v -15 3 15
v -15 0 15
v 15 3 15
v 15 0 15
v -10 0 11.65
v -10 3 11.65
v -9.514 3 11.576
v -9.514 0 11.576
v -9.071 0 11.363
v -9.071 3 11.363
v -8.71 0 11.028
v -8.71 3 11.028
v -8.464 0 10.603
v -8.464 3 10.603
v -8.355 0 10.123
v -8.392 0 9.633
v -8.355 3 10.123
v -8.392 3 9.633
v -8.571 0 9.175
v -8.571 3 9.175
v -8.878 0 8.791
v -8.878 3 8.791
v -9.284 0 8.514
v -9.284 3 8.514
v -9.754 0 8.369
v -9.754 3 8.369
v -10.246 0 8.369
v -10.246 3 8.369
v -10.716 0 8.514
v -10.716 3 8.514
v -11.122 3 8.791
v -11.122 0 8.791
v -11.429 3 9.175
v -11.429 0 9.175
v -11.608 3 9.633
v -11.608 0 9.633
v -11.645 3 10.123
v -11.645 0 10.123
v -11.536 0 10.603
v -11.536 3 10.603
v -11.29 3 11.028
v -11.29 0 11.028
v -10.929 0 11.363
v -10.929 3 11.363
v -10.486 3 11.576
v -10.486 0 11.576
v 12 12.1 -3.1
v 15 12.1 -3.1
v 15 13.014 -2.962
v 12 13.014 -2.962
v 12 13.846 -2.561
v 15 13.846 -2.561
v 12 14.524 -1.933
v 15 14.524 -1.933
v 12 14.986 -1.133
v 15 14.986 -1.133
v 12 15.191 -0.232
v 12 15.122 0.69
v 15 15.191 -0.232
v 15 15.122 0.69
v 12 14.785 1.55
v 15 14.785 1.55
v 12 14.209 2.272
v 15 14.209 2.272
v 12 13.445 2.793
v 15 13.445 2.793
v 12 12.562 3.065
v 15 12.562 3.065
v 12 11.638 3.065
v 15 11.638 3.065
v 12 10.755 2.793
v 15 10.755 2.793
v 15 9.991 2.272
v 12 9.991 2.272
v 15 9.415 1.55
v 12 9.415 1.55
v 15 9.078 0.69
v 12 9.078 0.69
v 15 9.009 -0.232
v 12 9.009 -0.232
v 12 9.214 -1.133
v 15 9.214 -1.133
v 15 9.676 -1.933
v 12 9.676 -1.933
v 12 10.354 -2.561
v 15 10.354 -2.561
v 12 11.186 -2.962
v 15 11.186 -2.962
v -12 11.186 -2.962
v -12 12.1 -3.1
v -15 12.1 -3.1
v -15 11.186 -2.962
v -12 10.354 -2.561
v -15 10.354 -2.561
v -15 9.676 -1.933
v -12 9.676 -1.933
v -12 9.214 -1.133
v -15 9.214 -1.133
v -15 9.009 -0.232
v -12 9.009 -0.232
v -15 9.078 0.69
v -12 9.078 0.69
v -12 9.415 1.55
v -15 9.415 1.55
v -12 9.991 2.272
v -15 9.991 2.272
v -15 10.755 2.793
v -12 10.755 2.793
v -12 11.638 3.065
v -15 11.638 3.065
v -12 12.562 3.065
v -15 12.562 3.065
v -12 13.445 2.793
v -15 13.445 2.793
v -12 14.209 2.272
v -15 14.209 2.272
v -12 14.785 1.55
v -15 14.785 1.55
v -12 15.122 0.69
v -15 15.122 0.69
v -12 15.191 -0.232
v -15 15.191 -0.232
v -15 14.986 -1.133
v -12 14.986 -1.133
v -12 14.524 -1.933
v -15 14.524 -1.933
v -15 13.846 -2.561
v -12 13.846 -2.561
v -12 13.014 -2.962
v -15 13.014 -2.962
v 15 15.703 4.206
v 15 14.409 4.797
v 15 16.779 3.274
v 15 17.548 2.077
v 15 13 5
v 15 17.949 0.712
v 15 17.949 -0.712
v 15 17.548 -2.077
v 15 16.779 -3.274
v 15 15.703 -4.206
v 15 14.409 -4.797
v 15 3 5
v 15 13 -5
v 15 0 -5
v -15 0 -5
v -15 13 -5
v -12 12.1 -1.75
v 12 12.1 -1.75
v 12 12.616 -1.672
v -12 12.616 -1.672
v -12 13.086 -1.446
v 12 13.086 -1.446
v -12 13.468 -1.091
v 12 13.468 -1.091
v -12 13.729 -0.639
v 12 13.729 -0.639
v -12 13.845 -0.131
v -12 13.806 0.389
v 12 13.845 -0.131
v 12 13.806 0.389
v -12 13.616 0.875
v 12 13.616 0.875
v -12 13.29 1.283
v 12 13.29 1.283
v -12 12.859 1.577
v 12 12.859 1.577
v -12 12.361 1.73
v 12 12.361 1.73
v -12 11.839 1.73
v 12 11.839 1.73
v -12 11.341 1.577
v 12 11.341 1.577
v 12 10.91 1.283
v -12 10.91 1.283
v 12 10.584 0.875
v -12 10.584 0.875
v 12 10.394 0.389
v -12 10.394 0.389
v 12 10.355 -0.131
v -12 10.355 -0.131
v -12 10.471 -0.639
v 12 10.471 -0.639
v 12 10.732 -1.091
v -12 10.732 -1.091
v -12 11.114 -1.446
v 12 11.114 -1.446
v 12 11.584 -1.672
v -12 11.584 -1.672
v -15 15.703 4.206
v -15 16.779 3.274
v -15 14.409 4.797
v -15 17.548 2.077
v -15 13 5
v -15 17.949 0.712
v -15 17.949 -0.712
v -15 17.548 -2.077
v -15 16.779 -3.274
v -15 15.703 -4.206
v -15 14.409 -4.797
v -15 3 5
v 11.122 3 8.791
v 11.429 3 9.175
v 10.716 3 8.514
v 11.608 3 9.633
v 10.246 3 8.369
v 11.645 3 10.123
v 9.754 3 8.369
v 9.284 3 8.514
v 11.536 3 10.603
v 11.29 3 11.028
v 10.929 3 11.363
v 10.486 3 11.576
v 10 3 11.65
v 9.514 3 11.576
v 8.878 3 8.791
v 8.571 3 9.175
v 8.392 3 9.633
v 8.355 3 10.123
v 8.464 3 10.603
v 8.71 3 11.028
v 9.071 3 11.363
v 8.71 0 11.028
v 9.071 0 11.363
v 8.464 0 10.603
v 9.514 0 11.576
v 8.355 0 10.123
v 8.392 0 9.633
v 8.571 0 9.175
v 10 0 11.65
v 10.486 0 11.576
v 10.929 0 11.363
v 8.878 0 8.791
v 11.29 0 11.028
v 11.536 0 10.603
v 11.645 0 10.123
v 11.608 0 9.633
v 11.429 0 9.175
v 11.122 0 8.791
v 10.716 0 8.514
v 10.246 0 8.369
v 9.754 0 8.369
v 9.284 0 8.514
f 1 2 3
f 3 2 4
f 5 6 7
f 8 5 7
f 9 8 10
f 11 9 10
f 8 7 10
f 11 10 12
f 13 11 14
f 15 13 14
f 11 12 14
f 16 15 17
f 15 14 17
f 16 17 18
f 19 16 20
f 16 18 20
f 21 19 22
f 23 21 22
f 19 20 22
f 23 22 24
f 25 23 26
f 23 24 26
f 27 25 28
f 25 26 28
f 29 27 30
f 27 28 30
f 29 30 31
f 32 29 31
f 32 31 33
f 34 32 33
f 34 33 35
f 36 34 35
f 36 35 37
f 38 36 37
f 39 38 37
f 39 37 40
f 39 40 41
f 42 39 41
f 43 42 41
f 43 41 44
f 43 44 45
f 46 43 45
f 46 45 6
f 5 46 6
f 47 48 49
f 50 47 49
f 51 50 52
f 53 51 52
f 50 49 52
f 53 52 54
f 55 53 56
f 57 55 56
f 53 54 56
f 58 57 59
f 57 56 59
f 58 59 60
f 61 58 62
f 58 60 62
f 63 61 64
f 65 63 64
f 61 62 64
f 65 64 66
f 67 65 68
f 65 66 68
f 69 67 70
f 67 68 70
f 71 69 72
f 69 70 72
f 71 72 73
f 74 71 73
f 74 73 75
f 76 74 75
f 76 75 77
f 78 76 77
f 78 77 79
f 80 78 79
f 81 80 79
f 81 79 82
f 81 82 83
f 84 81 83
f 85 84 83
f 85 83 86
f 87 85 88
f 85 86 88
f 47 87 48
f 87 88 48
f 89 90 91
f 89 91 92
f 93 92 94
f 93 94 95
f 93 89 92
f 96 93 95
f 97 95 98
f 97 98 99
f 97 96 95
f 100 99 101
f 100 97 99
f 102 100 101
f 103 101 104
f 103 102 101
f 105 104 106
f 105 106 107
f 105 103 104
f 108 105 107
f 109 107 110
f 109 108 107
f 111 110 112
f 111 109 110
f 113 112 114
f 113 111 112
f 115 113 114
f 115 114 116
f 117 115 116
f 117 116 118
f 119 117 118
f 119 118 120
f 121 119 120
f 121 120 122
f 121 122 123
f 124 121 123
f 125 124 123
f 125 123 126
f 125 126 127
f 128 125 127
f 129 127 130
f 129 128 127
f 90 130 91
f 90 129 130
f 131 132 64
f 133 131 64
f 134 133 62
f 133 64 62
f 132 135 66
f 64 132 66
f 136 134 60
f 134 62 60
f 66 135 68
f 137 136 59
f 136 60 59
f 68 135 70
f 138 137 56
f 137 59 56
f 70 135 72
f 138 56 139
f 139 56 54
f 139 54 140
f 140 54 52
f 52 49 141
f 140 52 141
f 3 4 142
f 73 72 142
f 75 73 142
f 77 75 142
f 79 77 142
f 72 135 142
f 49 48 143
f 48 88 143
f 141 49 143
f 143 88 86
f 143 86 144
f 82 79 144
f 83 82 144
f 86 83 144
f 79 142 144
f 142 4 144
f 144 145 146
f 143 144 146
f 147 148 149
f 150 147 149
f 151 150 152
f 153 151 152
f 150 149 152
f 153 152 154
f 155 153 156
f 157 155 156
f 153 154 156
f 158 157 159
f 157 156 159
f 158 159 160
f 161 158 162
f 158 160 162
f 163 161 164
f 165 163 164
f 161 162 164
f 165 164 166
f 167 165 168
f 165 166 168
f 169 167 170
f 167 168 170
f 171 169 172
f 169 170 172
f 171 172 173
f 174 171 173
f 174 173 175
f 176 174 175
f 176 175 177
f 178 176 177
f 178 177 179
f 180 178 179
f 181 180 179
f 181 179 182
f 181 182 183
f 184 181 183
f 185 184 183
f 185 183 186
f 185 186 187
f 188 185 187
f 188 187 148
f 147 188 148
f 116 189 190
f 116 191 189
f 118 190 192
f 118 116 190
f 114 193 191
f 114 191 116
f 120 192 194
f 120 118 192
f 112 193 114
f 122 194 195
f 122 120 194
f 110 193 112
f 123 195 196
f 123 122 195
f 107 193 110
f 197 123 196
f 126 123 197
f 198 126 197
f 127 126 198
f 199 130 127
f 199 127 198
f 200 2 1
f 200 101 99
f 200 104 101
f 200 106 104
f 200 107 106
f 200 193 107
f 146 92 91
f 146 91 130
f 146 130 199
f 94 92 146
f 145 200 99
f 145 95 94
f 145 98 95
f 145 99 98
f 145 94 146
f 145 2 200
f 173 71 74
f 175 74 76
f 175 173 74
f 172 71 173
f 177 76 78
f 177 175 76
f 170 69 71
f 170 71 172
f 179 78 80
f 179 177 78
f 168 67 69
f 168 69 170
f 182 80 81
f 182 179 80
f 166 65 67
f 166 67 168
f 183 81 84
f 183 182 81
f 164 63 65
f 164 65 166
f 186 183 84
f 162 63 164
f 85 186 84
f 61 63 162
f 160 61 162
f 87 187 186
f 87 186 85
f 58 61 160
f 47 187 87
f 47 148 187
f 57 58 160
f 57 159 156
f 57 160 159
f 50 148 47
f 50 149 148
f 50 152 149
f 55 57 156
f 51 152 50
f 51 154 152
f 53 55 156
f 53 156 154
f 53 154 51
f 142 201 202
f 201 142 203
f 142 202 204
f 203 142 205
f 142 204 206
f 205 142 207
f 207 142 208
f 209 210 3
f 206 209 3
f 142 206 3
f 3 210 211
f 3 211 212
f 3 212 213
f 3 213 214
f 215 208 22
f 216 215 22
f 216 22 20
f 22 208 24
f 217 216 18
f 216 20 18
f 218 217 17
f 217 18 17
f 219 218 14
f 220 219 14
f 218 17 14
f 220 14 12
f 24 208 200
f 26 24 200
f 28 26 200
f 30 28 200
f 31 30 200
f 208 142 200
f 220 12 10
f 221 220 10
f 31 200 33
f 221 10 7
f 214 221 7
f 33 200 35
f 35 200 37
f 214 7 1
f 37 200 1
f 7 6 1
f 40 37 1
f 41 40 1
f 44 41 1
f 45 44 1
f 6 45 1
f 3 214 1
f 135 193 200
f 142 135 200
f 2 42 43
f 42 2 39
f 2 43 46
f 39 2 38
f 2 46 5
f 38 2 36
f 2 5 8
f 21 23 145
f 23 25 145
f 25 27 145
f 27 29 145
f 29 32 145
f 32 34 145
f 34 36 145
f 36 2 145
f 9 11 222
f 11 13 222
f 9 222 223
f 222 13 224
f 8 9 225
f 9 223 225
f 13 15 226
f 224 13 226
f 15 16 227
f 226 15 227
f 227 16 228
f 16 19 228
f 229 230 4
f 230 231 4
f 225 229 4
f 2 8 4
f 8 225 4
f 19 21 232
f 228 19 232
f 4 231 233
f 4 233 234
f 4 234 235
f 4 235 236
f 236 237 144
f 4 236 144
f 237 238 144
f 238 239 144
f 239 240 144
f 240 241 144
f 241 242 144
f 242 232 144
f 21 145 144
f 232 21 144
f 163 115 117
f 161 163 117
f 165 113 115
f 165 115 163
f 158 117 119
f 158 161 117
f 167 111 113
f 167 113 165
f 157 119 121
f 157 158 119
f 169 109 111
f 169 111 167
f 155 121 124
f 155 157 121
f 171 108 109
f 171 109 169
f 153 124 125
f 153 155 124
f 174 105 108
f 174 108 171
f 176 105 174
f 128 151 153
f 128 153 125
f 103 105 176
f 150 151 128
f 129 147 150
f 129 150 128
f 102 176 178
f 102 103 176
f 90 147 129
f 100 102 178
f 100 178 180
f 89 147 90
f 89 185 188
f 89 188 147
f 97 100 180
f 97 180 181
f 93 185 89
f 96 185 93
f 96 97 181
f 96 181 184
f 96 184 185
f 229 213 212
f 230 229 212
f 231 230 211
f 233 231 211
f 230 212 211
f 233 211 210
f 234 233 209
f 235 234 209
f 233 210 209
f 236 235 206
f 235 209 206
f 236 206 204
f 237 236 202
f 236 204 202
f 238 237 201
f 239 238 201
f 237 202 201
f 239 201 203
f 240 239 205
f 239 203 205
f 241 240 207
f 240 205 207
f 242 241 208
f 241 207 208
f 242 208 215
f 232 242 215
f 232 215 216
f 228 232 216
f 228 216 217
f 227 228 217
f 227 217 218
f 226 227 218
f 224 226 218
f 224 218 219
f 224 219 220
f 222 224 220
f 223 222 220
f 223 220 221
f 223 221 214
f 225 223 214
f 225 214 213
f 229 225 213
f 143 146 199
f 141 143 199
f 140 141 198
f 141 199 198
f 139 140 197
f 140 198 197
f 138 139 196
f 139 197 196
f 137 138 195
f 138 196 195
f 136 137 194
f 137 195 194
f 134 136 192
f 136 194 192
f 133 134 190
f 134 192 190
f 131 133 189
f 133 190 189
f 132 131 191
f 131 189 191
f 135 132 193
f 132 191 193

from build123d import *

# Parameters (mm, degrees)
SKETCH1_W           = 30
SKETCH1_H           = 30
BOSS_EXTRUDE1_DEPTH = 22.1
SKETCH2_R           = 3.1
CUT_EXTRUDE1_DEPTH  = 3
SKETCH3_R           = 1.75
CUT_EXTRUDE2_DEPTH  = 38.979073185
CUT_EXTRUDE3_START  = -3
SKETCH4_R           = 3.1
CUT_EXTRUDE3_DEPTH  = 3
SKETCH5_R           = 1.649559613
CUT_EXTRUDE4_DEPTH  = 31.633478418
CUT_EXTRUDE5_DEPTH  = 41.167275237


with BuildPart() as part:
    # Sketch1 → Boss-Extrude1 (new body)
    with BuildSketch(Plane(origin=(0, 0, 0), x_dir=(1, 0, 0), z_dir=(0, 1, 0))):
        Rectangle(SKETCH1_W, SKETCH1_H)
    extrude(amount=BOSS_EXTRUDE1_DEPTH)

    # Sketch2 → Cut-Extrude1 (cut)
    with BuildSketch(Plane(origin=(15, 0, 0), x_dir=(0, 0, -1), z_dir=(1, 0, 0))):
        with Locations((0, 12.1)):
            Circle(SKETCH2_R)
    extrude(amount=-CUT_EXTRUDE1_DEPTH, mode=Mode.SUBTRACT)

    # Sketch3 → Cut-Extrude2 (cut, through all)
    with BuildSketch(Plane(origin=(12, 0, 0), x_dir=(0, 0, -1), z_dir=(1, 0, 0))):
        with Locations((0, 12.1)):
            Circle(SKETCH3_R)
    extrude(amount=-CUT_EXTRUDE2_DEPTH, mode=Mode.SUBTRACT)

    # Sketch4 → Cut-Extrude3 (cut)
    with BuildSketch(Plane.ZY.offset(15).offset(CUT_EXTRUDE3_START)):
        with Locations(Location((0, 12.1, 0), (0, 0, 180))):
            Circle(SKETCH4_R)
    extrude(amount=CUT_EXTRUDE3_DEPTH, mode=Mode.SUBTRACT)

    # Sketch5 → Cut-Extrude4 (cut, through all)
    with BuildSketch(Plane(origin=(0, 22.1, 0), x_dir=(1, 0, 0), z_dir=(0, 1, 0))):
        with Locations(Location((-10, 10, 0), (0, 0, 270))):
            Circle(SKETCH5_R)
        with Locations(Location((10, 10, 0), (0, 0, 270))):
            Circle(SKETCH5_R)
        with Locations(Location((10, -10, 0), (0, 0, 270))):
            Circle(SKETCH5_R)
        with Locations(Location((-10, -10, 0), (0, 0, 270))):
            Circle(SKETCH5_R)
    extrude(amount=-CUT_EXTRUDE4_DEPTH, mode=Mode.SUBTRACT)

    # Sketch6 → Cut-Extrude5 (cut, through all)
    with BuildSketch(Plane.ZY.offset(15)):
        with BuildLine():
            Line((-5, 3), (-5, 13))
            ThreePointArc((-5, 13), (0, 18), (5, 13))
            Line((5, 13), (5, 3))
            Line((5, 3), (15, 3))
            Line((15, 3), (15, 22.1))
            Line((15, 22.1), (-15, 22.1))
            Line((-15, 22.1), (-15, 3))
            Line((-15, 3), (-15, 0))
            Line((-15, 0), (-5, 0))
            Line((-5, 0), (-5, 3))
        make_face()
    extrude(amount=-CUT_EXTRUDE5_DEPTH, mode=Mode.SUBTRACT)


solid = part.part
